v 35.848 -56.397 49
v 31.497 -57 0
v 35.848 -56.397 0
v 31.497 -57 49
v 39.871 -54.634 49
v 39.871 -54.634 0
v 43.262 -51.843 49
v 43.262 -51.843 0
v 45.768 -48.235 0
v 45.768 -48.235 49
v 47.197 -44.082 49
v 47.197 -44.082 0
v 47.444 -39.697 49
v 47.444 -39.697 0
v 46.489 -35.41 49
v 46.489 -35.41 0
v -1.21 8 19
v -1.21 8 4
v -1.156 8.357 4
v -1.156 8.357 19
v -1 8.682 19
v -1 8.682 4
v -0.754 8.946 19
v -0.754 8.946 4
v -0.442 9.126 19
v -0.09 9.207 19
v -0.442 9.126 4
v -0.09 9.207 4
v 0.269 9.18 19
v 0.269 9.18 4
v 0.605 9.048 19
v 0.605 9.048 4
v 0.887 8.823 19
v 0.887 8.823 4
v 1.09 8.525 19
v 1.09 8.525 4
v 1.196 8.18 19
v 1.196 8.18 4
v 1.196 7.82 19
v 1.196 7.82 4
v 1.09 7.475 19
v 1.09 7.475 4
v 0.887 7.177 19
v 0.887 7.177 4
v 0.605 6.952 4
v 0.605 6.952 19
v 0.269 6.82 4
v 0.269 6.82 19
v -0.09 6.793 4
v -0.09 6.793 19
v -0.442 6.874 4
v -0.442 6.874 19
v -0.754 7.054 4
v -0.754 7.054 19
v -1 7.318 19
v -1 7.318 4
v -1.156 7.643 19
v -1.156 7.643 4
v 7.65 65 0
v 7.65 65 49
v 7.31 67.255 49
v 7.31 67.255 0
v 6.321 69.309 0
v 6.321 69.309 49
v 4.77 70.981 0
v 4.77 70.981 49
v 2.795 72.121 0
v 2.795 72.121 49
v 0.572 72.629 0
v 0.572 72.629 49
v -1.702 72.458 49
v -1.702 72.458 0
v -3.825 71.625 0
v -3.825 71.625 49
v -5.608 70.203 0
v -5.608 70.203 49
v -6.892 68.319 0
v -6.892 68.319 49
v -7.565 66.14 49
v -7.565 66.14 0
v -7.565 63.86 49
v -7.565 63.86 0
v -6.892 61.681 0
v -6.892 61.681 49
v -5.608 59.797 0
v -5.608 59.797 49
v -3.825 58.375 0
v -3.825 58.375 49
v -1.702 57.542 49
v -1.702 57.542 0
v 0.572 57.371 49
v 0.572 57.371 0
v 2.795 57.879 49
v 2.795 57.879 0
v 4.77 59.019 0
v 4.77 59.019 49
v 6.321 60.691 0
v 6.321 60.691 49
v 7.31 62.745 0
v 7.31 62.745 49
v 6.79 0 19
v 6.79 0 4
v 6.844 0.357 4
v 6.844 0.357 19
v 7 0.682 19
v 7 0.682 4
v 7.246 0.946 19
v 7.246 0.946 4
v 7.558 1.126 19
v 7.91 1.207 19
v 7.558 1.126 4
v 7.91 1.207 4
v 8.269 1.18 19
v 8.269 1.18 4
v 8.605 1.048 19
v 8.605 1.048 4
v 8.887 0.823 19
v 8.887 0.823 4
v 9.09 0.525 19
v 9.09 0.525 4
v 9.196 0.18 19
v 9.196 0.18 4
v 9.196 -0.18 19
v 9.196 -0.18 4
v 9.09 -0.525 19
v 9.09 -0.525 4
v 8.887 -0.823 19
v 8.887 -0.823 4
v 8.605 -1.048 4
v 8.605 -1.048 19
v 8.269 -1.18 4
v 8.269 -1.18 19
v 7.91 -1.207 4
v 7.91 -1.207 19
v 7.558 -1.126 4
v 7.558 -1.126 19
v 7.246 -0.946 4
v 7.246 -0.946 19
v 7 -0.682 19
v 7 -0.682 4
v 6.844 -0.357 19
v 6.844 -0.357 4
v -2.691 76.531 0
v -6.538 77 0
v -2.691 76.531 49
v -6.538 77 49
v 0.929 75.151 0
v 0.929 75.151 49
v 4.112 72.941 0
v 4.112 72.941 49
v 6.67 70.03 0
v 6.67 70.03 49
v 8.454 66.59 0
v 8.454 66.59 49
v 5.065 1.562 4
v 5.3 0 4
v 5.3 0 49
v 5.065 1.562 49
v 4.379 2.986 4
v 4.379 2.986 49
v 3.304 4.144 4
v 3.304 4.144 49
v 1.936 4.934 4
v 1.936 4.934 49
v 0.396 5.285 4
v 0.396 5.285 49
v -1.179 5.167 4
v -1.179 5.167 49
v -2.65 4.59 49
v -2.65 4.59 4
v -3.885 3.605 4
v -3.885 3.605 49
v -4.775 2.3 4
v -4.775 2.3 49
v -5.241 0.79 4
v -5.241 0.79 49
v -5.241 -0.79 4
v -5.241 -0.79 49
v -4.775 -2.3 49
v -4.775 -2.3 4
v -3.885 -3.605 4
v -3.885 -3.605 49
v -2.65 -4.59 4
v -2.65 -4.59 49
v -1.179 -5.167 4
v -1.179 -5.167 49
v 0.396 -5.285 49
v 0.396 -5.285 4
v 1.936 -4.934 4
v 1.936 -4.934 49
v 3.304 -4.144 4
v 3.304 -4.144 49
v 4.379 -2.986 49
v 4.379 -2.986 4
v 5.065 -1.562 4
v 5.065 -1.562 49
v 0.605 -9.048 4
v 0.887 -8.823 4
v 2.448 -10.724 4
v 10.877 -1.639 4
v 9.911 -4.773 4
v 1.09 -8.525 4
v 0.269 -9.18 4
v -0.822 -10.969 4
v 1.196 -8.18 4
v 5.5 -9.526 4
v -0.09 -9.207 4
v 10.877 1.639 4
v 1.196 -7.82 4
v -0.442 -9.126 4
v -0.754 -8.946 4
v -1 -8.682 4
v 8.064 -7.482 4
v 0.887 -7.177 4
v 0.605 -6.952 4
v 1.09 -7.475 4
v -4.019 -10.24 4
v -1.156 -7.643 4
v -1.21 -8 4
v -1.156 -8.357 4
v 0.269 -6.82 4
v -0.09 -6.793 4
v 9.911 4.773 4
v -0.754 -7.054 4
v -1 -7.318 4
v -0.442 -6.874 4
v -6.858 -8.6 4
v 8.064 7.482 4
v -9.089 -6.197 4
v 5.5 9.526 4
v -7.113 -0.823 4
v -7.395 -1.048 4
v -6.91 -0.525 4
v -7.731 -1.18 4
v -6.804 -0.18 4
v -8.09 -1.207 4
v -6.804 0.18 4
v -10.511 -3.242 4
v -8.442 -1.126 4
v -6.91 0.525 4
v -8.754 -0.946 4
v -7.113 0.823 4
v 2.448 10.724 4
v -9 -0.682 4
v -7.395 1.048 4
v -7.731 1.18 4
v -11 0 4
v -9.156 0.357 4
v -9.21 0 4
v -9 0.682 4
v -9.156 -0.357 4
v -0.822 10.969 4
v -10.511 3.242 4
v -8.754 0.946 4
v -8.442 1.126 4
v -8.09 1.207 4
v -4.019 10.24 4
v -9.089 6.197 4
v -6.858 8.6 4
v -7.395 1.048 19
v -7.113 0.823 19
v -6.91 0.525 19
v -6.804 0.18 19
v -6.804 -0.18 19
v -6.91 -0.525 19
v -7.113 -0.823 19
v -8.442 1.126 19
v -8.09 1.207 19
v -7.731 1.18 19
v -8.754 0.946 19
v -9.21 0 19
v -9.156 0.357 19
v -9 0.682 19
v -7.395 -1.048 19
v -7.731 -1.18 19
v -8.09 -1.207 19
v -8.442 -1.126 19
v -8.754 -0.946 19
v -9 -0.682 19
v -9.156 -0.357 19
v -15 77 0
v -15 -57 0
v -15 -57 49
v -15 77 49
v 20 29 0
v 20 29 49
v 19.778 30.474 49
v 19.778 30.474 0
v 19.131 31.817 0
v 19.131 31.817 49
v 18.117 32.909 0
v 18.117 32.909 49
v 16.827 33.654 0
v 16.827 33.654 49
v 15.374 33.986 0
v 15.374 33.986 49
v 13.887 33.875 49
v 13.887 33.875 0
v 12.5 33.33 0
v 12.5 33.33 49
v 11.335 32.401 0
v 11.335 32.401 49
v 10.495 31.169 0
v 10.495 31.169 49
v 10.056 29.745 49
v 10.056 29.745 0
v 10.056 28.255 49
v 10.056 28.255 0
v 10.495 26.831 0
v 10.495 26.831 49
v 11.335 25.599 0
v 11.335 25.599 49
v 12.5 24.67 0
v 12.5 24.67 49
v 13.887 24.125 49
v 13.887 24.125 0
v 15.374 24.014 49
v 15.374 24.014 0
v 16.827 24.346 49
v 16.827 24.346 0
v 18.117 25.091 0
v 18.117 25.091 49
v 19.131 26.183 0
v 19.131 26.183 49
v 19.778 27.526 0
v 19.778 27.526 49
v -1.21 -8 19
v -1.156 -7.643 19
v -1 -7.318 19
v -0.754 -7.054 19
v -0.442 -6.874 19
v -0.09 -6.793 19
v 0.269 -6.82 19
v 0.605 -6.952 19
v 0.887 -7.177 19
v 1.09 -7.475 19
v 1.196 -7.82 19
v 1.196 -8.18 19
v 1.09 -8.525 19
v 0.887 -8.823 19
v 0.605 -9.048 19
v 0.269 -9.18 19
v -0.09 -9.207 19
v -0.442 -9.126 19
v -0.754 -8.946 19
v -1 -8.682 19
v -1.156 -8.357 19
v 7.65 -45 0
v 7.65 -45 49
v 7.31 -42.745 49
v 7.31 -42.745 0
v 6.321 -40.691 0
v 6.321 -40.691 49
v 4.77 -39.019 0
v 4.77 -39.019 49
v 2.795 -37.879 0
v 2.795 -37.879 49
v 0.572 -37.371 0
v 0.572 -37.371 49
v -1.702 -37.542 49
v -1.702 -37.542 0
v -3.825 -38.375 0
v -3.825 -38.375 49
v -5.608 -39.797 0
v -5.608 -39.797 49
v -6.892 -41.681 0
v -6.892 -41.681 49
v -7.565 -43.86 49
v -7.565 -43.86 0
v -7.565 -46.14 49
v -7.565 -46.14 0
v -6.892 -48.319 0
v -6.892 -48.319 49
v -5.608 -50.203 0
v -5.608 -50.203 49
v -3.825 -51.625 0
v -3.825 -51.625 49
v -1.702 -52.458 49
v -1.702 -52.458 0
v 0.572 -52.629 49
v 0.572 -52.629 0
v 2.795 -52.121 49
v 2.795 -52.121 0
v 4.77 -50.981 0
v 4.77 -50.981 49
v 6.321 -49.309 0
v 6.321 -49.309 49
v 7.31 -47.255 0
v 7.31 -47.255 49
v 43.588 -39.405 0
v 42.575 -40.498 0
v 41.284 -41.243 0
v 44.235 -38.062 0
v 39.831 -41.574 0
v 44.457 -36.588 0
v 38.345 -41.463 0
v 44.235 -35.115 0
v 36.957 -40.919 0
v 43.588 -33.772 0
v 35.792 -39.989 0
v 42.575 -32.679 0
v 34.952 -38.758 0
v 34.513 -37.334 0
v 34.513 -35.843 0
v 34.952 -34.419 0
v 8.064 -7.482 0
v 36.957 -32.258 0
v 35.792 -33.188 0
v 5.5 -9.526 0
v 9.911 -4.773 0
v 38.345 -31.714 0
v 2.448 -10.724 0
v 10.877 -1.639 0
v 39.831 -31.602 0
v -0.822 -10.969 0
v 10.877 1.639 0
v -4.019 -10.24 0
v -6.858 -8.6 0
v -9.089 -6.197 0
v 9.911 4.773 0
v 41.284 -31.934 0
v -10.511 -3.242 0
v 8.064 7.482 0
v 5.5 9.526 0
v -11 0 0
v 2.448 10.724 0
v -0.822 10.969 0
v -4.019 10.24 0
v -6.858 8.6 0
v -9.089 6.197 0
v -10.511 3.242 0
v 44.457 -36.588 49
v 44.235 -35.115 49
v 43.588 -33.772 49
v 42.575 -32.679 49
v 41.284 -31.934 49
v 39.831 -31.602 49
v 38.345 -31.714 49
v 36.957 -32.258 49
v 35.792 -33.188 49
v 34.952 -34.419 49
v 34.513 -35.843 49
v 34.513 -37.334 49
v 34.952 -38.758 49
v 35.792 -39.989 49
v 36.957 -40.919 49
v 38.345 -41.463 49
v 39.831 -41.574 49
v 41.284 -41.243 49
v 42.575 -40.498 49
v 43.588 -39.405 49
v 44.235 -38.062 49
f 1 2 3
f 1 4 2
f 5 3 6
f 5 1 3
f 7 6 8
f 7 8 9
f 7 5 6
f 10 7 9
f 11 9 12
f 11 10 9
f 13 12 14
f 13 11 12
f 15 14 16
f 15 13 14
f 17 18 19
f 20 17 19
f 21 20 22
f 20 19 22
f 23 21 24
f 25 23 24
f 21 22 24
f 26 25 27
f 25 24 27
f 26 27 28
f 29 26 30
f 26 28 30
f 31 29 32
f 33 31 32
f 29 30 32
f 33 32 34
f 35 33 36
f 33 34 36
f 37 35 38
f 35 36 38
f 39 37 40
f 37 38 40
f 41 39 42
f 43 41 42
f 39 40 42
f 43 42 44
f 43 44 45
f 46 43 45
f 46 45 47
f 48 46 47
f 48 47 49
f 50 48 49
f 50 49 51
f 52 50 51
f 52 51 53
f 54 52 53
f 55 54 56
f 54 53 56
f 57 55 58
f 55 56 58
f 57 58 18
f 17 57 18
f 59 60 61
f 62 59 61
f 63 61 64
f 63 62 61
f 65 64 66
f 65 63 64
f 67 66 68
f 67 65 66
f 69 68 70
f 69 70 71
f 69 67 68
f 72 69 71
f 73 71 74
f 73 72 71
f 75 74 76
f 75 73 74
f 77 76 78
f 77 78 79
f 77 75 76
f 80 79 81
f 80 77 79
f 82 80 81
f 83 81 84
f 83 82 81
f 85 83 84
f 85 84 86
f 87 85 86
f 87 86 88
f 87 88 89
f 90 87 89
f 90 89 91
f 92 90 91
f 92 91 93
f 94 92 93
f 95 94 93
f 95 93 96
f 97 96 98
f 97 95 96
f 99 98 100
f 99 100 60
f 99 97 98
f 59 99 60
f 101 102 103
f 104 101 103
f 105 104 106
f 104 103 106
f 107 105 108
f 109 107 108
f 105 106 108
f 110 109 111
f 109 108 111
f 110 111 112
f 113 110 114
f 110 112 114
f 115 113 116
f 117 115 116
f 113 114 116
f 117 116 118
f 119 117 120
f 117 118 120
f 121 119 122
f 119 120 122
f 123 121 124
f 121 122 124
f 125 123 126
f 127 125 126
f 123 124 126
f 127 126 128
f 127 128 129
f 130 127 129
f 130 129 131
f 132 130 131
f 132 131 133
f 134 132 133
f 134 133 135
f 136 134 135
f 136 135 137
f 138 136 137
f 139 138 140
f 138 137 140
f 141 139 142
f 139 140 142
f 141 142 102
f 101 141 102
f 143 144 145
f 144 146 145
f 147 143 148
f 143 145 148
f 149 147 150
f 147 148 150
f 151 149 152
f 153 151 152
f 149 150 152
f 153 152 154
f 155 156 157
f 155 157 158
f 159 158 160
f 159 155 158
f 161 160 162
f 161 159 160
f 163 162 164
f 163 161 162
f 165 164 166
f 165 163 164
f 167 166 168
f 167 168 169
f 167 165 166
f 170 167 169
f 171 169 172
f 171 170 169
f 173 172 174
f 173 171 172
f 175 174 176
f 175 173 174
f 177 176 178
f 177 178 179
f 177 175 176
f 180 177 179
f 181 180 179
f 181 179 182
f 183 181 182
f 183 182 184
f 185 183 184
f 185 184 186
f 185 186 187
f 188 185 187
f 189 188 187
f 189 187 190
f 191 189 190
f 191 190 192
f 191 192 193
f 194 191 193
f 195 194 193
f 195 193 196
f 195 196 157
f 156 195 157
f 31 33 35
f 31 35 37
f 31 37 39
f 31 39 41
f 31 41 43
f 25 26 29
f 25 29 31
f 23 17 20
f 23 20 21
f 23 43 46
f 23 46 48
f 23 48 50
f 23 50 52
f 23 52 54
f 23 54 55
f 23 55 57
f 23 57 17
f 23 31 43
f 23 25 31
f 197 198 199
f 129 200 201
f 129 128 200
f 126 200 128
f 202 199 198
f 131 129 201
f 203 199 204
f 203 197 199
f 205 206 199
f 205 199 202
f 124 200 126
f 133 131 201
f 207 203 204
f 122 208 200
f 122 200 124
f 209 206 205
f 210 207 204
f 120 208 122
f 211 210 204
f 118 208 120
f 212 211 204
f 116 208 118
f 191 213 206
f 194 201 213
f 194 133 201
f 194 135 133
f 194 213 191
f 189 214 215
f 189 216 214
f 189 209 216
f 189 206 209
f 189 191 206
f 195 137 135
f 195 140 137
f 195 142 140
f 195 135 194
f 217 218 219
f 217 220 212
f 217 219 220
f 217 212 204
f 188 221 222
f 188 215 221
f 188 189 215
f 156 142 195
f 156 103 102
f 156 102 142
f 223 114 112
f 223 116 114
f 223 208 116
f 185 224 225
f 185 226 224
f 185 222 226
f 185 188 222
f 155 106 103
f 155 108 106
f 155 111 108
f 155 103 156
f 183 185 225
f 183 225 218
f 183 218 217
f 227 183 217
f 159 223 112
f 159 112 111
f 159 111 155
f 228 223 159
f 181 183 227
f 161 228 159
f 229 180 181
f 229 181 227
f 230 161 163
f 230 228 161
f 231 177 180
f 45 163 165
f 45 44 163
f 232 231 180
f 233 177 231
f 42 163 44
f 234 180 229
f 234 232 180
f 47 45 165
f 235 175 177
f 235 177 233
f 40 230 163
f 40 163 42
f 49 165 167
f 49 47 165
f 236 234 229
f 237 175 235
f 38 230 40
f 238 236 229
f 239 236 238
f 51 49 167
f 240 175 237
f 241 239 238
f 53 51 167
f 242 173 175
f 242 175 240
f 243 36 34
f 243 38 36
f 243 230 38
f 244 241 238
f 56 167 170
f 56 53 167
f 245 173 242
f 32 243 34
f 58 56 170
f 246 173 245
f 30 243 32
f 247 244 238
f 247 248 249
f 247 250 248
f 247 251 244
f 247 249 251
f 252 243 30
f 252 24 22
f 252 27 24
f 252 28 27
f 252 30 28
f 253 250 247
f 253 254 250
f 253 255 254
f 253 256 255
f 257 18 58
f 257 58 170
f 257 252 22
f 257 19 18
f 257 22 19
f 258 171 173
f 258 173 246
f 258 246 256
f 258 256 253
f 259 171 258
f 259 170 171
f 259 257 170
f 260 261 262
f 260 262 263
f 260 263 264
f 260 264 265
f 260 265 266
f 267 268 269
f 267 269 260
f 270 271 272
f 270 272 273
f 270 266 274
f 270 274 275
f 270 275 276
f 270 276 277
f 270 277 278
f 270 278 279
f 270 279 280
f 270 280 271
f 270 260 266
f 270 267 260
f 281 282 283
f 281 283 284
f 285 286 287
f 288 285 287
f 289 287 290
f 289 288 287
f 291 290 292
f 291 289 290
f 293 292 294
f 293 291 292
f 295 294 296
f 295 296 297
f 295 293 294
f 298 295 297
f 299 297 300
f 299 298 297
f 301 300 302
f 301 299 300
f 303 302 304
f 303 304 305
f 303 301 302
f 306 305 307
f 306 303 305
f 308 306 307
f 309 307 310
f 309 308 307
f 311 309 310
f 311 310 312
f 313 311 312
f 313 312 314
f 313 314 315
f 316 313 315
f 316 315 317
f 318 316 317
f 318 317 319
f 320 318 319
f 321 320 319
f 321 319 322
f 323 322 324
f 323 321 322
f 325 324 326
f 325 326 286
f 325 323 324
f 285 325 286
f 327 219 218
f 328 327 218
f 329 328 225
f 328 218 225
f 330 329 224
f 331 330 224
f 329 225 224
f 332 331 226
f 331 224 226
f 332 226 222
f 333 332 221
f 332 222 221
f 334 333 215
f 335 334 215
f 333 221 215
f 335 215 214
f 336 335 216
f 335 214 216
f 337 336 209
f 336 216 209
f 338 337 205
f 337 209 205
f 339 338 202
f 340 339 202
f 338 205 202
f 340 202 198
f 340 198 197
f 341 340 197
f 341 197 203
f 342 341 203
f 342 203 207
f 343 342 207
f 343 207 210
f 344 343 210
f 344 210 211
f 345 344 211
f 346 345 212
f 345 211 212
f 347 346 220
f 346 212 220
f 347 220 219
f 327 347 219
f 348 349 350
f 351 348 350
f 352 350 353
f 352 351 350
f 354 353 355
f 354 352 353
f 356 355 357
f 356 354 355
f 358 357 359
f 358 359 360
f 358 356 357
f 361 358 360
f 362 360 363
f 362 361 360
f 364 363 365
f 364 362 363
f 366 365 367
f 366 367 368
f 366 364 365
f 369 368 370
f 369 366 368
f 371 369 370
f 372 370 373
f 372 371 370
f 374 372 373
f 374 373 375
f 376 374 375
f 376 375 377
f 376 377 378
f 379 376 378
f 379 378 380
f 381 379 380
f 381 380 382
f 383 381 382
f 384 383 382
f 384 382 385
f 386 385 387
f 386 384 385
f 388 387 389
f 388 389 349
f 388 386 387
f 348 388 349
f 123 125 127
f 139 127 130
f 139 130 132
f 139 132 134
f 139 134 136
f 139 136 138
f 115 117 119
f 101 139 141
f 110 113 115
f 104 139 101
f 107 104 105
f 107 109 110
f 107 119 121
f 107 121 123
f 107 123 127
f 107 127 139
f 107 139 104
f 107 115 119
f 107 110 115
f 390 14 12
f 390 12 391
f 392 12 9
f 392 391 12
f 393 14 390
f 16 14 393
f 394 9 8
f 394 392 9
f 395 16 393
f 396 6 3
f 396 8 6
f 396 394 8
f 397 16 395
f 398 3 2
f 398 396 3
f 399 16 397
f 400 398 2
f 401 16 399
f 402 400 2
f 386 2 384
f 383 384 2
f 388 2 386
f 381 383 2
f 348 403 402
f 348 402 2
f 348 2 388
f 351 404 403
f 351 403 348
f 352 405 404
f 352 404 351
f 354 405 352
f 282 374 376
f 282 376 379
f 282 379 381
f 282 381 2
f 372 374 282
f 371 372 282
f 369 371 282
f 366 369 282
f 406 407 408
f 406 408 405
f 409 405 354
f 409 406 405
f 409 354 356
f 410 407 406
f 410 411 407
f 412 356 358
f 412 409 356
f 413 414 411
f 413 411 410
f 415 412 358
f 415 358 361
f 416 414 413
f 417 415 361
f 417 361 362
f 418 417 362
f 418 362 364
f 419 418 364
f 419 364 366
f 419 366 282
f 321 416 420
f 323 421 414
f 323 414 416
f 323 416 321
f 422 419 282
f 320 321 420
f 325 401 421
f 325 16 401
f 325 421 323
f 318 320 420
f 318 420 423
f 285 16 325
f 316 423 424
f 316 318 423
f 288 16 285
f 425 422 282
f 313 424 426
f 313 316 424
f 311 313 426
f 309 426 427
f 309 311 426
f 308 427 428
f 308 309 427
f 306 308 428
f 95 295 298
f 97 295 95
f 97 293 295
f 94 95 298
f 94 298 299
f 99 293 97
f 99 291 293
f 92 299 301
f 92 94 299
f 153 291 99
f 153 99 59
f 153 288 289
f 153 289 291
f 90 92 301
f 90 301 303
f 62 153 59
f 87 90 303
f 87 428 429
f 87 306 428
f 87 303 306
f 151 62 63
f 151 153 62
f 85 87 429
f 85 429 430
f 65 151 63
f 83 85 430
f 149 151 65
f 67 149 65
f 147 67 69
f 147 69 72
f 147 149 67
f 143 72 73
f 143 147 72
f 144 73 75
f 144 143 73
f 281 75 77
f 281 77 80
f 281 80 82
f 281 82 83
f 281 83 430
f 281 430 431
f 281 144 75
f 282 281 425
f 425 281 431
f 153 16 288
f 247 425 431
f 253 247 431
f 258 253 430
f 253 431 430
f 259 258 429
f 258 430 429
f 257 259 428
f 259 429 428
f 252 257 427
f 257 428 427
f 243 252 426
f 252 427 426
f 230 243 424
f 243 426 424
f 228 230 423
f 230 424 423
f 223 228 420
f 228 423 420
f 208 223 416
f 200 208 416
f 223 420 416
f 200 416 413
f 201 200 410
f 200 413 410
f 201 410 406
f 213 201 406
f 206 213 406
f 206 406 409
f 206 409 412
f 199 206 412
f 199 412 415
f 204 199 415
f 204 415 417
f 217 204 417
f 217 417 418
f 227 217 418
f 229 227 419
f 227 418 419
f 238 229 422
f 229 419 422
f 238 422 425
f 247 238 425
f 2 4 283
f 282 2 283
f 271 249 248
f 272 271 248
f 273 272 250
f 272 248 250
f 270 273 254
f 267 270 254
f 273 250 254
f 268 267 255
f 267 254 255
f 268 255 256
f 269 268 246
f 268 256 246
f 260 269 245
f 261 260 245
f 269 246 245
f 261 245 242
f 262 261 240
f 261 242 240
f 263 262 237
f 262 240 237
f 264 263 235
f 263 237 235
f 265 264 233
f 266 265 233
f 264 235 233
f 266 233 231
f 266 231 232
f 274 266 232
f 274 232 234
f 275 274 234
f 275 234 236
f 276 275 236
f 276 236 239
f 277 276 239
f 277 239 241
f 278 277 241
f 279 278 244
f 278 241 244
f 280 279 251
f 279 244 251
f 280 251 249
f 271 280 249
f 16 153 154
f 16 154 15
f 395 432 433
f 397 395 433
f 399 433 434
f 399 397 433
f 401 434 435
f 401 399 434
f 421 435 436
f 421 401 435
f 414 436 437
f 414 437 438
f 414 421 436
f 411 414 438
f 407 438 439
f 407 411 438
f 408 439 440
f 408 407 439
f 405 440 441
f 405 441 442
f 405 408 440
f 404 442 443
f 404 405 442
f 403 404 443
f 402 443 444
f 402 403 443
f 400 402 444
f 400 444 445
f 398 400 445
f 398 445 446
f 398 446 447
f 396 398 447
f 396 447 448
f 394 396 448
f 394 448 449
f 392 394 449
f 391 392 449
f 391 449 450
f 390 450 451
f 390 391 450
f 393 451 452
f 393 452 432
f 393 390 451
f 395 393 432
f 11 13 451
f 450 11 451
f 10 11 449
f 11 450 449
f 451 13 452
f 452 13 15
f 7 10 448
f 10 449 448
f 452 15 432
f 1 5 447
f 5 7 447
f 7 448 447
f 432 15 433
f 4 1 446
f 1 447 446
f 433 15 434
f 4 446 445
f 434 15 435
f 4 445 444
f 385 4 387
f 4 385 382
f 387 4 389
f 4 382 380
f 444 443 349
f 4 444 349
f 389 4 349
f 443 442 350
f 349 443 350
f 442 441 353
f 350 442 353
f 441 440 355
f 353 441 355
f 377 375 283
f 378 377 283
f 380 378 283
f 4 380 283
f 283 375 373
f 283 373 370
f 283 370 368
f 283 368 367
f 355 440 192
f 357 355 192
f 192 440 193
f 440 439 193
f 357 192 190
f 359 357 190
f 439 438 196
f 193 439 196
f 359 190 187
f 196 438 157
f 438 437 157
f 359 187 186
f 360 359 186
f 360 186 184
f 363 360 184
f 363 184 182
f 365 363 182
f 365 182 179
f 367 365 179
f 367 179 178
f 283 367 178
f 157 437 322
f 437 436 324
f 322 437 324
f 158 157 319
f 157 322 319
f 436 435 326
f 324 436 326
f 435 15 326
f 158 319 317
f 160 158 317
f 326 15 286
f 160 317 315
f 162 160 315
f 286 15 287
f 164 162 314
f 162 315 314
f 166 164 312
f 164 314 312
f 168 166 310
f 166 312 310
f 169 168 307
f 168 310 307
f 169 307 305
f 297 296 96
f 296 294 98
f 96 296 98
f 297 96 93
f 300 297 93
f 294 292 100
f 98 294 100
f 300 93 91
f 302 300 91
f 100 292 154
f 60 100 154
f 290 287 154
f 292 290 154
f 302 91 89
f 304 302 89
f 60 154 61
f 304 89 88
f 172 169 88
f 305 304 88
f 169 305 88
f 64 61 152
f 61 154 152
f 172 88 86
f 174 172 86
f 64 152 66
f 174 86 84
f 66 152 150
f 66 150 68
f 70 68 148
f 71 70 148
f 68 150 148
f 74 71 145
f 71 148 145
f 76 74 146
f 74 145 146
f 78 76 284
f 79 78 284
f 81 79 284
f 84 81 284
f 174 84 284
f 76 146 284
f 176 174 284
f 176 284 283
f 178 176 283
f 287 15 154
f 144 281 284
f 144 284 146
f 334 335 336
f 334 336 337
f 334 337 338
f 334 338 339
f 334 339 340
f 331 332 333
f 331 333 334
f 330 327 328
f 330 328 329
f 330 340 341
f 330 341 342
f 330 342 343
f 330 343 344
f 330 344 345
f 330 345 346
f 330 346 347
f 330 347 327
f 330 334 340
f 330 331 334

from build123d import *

# Parameters (mm, degrees)
SZKIC1_R                    = 7.65
SZKIC1_R_2                  = 5.3
SZKIC1_R_3                  = 5
DODANIE_WYCI_GNI_CIE1_DEPTH = 49
ZAOKR_GLENIE1_R             = 16
SZKIC2_R                    = 11
WYTNIJ_WYCI_GNI_CIE1_DEPTH  = 4
SZKIC3_R                    = 1.21
WYTNIJ_WYCI_GNI_CIE2_DEPTH  = 15


with BuildPart() as part:
    # Szkic1 → Dodanie-wyciągnięcie1 (new body)
    with BuildSketch(Plane.XY):
        Polygon((-15, -57), (-15, 77), (4.572094065, 77), (54.539400892, -57), align=None)
        with Locations((0, 65)):
            Circle(SZKIC1_R, mode=Mode.SUBTRACT)
        with Locations((0, -45)):
            Circle(SZKIC1_R, mode=Mode.SUBTRACT)
        Circle(SZKIC1_R_2, mode=Mode.SUBTRACT)
        with Locations((15, 29)):
            Circle(SZKIC1_R_3, mode=Mode.SUBTRACT)
        with Locations((39.457289313, -36.58842123)):
            Circle(SZKIC1_R_3, mode=Mode.SUBTRACT)
    extrude(amount=DODANIE_WYCI_GNI_CIE1_DEPTH)

    # Zaokrąglenie1
    zaokr_glenie1_edges = [part.edges().sort_by_distance(p)[0] for p in [
        (4.572094065, 77, 24.5),
        (54.539400892, -57, 24.5),
    ]]
    fillet(zaokr_glenie1_edges, radius=ZAOKR_GLENIE1_R)

    # Szkic2 → Wytnij-wyciągnięcie1 (cut)
    with BuildSketch(Plane(origin=(0, 0, 0), x_dir=(-1, 0, 0), z_dir=(0, 0, -1))):
        Circle(SZKIC2_R)
    extrude(amount=-WYTNIJ_WYCI_GNI_CIE1_DEPTH, mode=Mode.SUBTRACT)

    # Szkic3 → Wytnij-wyciągnięcie2 (cut)
    with BuildSketch(Plane(origin=(0, 0, 4), x_dir=(-1, 0, 0), z_dir=(0, 0, -1))):
        with Locations((0, 8)):
            Circle(SZKIC3_R)
        with Locations((8, 0)):
            Circle(SZKIC3_R)
        with Locations((0, -8)):
            Circle(SZKIC3_R)
        with Locations((-8, 0)):
            Circle(SZKIC3_R)
    extrude(amount=-WYTNIJ_WYCI_GNI_CIE2_DEPTH, mode=Mode.SUBTRACT)


solid = part.part
